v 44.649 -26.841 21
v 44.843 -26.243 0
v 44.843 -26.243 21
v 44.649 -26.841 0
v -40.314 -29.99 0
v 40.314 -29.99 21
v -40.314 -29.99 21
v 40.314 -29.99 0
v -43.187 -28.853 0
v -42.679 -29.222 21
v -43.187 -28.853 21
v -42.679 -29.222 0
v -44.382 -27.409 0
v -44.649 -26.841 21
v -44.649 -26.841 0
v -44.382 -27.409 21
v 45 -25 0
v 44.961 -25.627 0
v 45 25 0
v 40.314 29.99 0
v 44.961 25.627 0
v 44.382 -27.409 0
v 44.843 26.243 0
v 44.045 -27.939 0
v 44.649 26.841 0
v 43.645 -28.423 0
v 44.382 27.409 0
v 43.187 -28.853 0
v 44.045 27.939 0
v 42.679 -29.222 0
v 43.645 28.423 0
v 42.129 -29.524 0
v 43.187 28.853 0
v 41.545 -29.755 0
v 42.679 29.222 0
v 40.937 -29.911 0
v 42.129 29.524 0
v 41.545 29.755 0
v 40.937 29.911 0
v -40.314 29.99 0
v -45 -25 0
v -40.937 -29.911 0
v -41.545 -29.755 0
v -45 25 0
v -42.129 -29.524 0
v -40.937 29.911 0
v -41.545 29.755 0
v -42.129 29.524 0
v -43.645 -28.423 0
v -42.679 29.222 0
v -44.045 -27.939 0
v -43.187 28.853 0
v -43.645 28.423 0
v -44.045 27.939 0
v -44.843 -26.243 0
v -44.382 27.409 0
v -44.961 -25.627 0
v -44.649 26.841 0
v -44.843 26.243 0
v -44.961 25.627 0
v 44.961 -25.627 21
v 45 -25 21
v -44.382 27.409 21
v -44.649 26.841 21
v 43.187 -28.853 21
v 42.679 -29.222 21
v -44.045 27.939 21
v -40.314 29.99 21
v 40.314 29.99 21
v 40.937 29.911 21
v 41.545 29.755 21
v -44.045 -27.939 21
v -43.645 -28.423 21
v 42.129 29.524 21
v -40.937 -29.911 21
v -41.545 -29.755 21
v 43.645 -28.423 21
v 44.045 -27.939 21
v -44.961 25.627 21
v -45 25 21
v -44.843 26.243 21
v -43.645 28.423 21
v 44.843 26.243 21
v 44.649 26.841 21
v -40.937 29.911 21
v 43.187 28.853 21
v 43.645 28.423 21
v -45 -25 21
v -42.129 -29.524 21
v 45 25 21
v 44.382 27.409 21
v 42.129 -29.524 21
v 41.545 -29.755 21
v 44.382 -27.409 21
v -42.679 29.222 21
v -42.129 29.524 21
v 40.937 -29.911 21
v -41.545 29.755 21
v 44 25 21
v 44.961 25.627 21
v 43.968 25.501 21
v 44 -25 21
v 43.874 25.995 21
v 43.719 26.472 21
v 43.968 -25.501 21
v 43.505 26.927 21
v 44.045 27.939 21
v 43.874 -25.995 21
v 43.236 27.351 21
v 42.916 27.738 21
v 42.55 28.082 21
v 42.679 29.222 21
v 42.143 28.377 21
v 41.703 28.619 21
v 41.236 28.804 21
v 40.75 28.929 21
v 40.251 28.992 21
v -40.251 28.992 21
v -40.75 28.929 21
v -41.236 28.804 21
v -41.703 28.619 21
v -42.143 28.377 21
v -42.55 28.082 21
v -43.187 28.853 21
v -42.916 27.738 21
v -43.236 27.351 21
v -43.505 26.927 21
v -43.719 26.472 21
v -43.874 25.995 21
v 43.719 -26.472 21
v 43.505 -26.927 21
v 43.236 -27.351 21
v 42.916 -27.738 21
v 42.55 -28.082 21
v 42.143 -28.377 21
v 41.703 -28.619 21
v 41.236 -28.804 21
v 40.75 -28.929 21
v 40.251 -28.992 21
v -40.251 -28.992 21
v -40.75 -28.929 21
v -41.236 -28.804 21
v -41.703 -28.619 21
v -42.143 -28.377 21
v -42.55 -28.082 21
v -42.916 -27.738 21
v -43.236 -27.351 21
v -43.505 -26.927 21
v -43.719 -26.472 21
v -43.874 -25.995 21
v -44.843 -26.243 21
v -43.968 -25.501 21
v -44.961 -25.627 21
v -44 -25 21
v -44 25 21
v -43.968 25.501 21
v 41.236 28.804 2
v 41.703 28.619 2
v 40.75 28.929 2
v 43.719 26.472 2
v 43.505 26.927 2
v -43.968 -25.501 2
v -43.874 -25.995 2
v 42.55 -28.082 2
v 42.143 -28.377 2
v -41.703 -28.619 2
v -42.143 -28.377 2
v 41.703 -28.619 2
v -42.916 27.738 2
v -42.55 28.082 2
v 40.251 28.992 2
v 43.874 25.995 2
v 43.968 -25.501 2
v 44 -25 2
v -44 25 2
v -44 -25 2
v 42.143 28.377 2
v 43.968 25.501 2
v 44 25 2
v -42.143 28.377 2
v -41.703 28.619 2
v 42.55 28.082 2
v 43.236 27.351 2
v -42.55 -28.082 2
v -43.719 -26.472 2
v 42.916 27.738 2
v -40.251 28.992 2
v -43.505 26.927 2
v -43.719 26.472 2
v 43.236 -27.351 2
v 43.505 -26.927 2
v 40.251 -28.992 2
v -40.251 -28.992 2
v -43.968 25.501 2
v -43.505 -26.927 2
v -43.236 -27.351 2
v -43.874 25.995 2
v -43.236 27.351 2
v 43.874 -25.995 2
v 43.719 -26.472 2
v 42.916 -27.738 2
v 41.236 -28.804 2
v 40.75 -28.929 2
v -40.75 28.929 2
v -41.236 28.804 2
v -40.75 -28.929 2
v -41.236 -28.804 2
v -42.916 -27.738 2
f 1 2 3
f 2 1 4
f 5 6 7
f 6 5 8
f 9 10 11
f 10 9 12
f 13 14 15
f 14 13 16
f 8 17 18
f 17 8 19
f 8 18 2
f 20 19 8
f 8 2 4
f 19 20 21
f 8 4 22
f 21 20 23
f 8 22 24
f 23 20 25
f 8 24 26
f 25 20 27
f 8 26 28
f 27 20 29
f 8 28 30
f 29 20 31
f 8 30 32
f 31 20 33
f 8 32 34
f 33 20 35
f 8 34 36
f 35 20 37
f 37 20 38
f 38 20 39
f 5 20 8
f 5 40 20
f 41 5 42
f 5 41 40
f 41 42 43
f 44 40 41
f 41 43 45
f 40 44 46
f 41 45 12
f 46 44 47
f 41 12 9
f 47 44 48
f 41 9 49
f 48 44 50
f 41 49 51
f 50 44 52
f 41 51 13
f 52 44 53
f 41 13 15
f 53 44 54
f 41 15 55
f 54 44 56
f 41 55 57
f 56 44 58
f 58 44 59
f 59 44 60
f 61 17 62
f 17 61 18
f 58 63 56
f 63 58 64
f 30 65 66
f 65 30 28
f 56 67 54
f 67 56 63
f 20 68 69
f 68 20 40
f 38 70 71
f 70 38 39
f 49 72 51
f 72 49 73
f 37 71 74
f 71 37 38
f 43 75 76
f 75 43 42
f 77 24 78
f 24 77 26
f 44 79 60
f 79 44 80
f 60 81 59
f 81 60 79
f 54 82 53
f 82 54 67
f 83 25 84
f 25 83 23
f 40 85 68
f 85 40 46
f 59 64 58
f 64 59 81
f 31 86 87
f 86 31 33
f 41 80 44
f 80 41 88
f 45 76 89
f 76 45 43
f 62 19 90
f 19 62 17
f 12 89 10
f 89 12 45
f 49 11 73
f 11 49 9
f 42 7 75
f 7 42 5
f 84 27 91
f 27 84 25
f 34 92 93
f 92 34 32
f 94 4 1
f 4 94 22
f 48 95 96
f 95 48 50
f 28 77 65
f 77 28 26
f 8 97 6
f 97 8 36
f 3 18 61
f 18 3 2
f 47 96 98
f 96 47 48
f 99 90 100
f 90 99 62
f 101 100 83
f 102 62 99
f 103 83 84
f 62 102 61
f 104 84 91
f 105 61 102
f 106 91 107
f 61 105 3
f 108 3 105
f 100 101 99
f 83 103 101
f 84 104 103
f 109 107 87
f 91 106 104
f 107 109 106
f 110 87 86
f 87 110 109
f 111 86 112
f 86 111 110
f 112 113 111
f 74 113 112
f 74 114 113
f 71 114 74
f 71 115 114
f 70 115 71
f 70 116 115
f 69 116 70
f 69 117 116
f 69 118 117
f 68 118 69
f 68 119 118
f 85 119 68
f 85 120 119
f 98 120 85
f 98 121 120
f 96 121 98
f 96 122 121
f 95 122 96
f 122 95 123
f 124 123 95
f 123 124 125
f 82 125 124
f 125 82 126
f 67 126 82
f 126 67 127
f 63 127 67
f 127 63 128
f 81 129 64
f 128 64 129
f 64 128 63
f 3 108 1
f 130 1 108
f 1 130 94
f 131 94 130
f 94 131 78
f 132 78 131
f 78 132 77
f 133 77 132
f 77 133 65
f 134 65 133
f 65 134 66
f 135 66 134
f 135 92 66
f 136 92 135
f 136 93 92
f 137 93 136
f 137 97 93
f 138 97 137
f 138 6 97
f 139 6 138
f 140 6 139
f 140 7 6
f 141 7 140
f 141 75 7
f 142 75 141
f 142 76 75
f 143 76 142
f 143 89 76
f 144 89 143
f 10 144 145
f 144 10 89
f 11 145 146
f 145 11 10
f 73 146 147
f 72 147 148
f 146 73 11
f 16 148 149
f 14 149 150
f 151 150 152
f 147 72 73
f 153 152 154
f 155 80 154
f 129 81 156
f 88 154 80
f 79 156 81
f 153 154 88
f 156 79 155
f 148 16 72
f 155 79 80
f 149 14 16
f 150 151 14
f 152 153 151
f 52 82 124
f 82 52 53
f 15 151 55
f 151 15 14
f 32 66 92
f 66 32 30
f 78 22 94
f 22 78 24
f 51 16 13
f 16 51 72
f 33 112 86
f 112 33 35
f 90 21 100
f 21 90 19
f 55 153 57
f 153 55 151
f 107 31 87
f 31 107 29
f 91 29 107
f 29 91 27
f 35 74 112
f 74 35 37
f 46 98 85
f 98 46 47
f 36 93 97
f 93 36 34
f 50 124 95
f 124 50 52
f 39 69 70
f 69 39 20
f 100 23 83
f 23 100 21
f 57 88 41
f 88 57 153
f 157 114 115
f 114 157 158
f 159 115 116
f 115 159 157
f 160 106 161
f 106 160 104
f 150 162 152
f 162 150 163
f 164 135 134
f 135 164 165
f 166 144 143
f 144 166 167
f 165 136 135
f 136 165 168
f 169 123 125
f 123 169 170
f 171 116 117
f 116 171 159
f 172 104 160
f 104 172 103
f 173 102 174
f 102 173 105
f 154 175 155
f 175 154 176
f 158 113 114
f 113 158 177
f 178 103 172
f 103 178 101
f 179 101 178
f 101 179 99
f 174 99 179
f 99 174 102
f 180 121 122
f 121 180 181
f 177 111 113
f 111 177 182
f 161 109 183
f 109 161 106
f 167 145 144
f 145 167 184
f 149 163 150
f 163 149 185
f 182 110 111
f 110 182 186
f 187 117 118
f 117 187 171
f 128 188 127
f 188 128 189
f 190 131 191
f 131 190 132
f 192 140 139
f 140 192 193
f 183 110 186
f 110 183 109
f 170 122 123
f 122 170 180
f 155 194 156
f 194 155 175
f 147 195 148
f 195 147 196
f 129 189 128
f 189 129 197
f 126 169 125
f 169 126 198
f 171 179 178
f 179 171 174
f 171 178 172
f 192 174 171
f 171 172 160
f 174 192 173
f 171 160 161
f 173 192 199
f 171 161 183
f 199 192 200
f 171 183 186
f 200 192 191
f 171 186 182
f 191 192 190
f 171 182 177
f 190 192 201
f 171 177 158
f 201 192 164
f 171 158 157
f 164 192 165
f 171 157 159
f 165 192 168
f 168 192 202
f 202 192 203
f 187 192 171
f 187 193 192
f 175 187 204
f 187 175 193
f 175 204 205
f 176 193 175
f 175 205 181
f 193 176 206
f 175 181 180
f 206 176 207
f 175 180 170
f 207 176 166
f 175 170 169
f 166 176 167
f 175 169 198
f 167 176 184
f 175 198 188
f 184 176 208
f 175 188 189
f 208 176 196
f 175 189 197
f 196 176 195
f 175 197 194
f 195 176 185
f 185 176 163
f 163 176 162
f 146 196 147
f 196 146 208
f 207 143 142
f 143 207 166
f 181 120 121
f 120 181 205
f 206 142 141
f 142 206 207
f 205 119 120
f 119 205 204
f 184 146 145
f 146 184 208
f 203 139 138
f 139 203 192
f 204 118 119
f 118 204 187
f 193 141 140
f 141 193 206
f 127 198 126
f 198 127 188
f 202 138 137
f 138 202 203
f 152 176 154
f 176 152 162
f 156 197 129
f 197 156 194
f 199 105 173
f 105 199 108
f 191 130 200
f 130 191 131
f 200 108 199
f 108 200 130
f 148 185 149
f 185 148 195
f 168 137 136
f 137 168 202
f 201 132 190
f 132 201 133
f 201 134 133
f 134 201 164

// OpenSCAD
$fn = 50;


difference() {
	union() {
		hull() {
			translate(v = [-40.0000000000, 25.0000000000, 0]) {
				cylinder(h = 21, r = 5);
			}
			translate(v = [40.0000000000, 25.0000000000, 0]) {
				cylinder(h = 21, r = 5);
			}
			translate(v = [-40.0000000000, -25.0000000000, 0]) {
				cylinder(h = 21, r = 5);
			}
			translate(v = [40.0000000000, -25.0000000000, 0]) {
				cylinder(h = 21, r = 5);
			}
		}
	}
	union() {
		translate(v = [0, 0, 2]) {
			hull() {
				translate(v = [-40.0000000000, 25.0000000000, 0]) {
					cylinder(h = 19, r = 4);
				}
				translate(v = [40.0000000000, 25.0000000000, 0]) {
					cylinder(h = 19, r = 4);
				}
				translate(v = [-40.0000000000, -25.0000000000, 0]) {
					cylinder(h = 19, r = 4);
				}
				translate(v = [40.0000000000, -25.0000000000, 0]) {
					cylinder(h = 19, r = 4);
				}
			}
		}
	}
}
